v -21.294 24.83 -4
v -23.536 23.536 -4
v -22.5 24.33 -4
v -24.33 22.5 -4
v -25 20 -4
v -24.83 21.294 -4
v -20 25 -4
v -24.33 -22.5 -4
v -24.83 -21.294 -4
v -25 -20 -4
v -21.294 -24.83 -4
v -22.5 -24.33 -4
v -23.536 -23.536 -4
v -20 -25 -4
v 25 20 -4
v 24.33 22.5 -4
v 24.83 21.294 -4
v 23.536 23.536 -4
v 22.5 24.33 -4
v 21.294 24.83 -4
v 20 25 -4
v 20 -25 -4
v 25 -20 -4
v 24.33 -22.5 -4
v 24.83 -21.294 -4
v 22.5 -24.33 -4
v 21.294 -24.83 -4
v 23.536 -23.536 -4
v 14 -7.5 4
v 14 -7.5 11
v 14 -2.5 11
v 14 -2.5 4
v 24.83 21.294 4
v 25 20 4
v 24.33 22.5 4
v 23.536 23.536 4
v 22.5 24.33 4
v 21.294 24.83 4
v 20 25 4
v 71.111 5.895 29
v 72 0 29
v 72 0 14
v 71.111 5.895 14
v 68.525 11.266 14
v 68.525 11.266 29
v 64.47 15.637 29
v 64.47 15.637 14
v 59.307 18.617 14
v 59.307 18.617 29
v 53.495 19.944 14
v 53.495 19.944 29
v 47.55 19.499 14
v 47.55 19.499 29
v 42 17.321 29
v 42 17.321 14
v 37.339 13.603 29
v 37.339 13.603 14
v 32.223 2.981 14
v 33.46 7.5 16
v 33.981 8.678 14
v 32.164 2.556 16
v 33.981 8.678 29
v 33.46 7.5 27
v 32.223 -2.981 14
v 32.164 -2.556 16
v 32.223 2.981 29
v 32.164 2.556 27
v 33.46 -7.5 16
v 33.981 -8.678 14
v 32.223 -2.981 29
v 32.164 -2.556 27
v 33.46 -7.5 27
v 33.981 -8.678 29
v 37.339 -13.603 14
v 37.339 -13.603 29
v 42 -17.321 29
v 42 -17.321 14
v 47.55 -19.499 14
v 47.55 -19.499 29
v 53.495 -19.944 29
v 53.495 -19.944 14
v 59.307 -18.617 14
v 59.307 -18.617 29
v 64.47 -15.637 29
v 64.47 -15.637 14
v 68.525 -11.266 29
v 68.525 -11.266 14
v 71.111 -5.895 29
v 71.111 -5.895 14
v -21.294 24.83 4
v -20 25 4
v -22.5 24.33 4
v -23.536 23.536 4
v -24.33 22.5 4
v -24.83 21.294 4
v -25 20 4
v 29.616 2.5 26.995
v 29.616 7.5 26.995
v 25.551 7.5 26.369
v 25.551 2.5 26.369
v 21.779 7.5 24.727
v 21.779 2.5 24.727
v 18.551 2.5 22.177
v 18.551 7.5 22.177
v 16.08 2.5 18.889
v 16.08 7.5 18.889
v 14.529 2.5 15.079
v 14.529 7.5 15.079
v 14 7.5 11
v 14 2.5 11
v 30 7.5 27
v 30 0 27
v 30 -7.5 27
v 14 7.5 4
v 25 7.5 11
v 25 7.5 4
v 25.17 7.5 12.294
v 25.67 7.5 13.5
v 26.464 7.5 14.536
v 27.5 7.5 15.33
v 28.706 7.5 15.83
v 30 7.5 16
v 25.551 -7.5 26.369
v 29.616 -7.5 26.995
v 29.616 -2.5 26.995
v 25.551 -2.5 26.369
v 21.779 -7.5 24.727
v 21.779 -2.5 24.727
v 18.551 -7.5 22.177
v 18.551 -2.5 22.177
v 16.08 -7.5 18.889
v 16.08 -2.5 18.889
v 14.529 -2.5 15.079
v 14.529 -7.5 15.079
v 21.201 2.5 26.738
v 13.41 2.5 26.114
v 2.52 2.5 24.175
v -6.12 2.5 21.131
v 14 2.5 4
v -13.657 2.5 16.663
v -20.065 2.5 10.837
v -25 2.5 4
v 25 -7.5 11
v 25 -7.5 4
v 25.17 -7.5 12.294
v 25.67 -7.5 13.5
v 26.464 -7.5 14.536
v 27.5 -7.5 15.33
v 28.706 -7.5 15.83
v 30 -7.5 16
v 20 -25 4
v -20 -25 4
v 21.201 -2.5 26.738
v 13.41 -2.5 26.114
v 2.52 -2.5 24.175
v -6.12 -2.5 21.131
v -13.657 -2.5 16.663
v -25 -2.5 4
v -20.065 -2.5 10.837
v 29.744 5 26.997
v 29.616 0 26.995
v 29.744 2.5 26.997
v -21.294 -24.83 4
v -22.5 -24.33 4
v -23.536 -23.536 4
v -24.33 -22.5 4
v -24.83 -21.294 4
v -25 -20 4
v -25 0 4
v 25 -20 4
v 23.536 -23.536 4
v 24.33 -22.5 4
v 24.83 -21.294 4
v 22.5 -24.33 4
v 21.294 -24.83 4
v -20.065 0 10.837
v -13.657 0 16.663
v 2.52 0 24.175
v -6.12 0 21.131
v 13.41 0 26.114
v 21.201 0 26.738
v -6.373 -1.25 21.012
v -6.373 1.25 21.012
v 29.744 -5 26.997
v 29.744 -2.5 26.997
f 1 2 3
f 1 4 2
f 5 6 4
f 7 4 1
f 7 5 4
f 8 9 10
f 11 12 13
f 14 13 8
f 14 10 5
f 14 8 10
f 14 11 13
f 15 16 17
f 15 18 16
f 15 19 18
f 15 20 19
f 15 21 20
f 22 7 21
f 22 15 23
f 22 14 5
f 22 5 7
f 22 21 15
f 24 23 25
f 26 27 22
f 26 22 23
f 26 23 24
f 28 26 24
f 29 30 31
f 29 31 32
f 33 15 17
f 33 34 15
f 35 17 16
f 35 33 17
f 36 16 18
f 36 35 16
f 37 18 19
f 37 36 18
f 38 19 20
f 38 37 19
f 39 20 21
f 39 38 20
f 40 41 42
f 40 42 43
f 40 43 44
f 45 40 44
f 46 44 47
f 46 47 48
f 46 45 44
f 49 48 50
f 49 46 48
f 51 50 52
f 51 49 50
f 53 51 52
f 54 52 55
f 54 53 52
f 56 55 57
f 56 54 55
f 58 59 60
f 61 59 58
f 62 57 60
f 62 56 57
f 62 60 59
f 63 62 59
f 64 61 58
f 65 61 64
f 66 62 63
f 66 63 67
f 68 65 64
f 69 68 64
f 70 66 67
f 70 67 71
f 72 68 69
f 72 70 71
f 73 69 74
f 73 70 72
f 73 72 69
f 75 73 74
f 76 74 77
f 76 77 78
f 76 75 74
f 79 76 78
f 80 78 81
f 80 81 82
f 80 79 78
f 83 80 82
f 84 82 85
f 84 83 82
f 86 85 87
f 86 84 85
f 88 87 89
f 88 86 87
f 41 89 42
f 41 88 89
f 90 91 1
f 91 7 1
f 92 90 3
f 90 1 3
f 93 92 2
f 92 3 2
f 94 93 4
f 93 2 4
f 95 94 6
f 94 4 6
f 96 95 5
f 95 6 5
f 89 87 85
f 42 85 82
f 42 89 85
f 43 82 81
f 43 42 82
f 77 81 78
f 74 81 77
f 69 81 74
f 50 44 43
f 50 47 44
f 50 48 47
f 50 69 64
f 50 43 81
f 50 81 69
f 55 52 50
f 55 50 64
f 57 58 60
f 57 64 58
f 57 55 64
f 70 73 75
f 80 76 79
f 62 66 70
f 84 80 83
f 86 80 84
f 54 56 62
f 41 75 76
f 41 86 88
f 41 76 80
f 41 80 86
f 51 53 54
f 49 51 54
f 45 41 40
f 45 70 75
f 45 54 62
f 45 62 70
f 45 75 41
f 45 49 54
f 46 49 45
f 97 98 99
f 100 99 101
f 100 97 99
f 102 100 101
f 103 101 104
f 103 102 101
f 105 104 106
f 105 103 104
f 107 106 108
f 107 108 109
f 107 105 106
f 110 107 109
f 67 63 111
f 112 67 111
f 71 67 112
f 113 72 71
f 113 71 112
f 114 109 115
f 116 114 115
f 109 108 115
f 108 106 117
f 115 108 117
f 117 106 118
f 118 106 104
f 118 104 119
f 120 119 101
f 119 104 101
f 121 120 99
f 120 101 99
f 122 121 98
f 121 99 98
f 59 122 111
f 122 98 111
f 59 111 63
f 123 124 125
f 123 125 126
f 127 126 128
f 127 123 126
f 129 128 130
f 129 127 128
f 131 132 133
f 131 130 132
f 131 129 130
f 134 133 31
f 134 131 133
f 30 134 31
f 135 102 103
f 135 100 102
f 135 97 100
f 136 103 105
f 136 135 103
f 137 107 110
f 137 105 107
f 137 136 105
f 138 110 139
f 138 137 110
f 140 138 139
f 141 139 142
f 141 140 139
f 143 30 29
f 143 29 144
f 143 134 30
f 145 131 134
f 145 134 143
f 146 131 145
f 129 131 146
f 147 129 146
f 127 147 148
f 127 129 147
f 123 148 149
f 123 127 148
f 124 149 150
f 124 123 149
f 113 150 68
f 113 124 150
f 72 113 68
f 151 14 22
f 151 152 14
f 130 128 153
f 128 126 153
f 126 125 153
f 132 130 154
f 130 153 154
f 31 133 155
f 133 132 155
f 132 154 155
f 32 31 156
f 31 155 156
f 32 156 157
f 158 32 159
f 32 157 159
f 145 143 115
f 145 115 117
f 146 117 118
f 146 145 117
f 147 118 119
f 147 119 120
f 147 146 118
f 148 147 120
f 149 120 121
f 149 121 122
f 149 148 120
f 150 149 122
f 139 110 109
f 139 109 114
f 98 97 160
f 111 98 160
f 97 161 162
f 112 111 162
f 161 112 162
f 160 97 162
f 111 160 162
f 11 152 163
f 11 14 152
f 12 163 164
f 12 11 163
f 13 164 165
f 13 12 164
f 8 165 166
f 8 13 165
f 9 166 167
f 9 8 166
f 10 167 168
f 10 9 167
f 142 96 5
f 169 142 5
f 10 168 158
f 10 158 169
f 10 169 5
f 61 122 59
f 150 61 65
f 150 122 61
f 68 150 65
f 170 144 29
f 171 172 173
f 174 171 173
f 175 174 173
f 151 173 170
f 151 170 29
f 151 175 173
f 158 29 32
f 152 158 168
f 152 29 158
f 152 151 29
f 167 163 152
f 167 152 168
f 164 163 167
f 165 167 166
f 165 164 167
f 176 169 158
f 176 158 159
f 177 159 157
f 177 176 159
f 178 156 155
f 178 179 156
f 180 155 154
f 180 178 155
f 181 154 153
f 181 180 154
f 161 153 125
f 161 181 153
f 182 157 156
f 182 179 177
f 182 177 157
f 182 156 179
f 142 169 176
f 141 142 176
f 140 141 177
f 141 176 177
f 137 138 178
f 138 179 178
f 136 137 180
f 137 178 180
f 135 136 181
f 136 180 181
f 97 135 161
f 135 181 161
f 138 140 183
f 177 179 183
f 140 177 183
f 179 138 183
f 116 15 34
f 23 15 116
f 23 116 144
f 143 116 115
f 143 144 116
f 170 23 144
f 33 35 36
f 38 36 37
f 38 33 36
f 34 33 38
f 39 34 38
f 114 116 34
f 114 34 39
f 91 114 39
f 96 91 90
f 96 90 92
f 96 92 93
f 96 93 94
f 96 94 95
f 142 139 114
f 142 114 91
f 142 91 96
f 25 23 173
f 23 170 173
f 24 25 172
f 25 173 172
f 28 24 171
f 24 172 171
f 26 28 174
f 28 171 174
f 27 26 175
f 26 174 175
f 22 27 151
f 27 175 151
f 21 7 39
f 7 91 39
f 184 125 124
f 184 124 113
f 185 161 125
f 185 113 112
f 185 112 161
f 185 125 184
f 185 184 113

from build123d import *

# Parameters (mm, degrees)
F1_DEPTH = 25
F0_W     = 20
F0_H     = 11
F2_DEPTH = 7.5
F3_DEPTH = 2.5
F5_R     = 5


with BuildPart() as f1:
    # F0 (on Front) → F1 (new body, symmetric)
    with BuildSketch(Plane.XZ):
        Polygon((-25, -4), (25, -4), (25, 4), (14, 4), (-25, 4), align=None)
    extrude(amount=F1_DEPTH, both=True)

    # F0 (on Front) → F2 (join, symmetric)
    with BuildSketch(Plane.XZ):
        with BuildLine():
            Line((14, 4), (25, 4))
            Line((25, 4), (25, 11))
            ThreePointArc((25, 11), (26.4644660941, 14.5355339059), (30, 16))
            Line((30, 16), (32, 16))
            Line((32, 16), (32, 27))
            Line((32, 27), (30, 27))
            add(Edge.make_bspline(
                [(29.6159675373, 26.9953905569), (29.7437702017, 26.9970094957), (29.8717809107, 26.9985454717), (30, 27)],
                knots=[0.995223957, 0.995223957, 0.995223957, 0.995223957, 1, 1, 1, 1], degree=3))
            ThreePointArc((29.6159675373, 26.9953905569), (18.5513206132, 22.1771078682), (14, 11))
            Line((14, 11), (14, 4))
        make_face()
        with Locations((42, 21.5)):
            Rectangle(F0_W, F0_H)
    extrude(amount=F2_DEPTH, both=True)

    # F0 (on Front) → F3 (join, symmetric)
    with BuildSketch(Plane.XZ):
        with BuildLine():
            add(Edge.make_bspline(
                [(-25, 4), (-20.9363555228, 11.1345288275), (-6.6078681518, 24.5104887957), (15.0992011527, 26.8114995805), (29.6159675373, 26.9953905569)],
                knots=[0, 0, 0, 0, 0.4527258751, 0.995223957, 0.995223957, 0.995223957, 0.995223957], degree=3))
            Line((-25, 4), (14, 4))
            Line((14, 4), (14, 11))
            ThreePointArc((14, 11), (18.5513206132, 22.1771078682), (29.6159675373, 26.9953905569))
        make_face()
    extrude(amount=F3_DEPTH, both=True)

    # F0 (on Front) → F4 (revolve)
    with BuildSketch(Plane.XZ):
        Polygon((52, 27), (52, 16), (52, 14), (72, 14), (72, 29), (52, 29), align=None)
    revolve(axis=Axis((52, 0, 21.5), (0, 0, 1)))

    # F5
    f5_edges = [f1.edges().sort_by_distance(p)[0] for p in [
        (25, 25, 0),
        (-25, 25, 0),
        (-25, -25, 0),
        (25, -25, 0),
    ]]
    fillet(f5_edges, radius=F5_R)


solid = f1.part
